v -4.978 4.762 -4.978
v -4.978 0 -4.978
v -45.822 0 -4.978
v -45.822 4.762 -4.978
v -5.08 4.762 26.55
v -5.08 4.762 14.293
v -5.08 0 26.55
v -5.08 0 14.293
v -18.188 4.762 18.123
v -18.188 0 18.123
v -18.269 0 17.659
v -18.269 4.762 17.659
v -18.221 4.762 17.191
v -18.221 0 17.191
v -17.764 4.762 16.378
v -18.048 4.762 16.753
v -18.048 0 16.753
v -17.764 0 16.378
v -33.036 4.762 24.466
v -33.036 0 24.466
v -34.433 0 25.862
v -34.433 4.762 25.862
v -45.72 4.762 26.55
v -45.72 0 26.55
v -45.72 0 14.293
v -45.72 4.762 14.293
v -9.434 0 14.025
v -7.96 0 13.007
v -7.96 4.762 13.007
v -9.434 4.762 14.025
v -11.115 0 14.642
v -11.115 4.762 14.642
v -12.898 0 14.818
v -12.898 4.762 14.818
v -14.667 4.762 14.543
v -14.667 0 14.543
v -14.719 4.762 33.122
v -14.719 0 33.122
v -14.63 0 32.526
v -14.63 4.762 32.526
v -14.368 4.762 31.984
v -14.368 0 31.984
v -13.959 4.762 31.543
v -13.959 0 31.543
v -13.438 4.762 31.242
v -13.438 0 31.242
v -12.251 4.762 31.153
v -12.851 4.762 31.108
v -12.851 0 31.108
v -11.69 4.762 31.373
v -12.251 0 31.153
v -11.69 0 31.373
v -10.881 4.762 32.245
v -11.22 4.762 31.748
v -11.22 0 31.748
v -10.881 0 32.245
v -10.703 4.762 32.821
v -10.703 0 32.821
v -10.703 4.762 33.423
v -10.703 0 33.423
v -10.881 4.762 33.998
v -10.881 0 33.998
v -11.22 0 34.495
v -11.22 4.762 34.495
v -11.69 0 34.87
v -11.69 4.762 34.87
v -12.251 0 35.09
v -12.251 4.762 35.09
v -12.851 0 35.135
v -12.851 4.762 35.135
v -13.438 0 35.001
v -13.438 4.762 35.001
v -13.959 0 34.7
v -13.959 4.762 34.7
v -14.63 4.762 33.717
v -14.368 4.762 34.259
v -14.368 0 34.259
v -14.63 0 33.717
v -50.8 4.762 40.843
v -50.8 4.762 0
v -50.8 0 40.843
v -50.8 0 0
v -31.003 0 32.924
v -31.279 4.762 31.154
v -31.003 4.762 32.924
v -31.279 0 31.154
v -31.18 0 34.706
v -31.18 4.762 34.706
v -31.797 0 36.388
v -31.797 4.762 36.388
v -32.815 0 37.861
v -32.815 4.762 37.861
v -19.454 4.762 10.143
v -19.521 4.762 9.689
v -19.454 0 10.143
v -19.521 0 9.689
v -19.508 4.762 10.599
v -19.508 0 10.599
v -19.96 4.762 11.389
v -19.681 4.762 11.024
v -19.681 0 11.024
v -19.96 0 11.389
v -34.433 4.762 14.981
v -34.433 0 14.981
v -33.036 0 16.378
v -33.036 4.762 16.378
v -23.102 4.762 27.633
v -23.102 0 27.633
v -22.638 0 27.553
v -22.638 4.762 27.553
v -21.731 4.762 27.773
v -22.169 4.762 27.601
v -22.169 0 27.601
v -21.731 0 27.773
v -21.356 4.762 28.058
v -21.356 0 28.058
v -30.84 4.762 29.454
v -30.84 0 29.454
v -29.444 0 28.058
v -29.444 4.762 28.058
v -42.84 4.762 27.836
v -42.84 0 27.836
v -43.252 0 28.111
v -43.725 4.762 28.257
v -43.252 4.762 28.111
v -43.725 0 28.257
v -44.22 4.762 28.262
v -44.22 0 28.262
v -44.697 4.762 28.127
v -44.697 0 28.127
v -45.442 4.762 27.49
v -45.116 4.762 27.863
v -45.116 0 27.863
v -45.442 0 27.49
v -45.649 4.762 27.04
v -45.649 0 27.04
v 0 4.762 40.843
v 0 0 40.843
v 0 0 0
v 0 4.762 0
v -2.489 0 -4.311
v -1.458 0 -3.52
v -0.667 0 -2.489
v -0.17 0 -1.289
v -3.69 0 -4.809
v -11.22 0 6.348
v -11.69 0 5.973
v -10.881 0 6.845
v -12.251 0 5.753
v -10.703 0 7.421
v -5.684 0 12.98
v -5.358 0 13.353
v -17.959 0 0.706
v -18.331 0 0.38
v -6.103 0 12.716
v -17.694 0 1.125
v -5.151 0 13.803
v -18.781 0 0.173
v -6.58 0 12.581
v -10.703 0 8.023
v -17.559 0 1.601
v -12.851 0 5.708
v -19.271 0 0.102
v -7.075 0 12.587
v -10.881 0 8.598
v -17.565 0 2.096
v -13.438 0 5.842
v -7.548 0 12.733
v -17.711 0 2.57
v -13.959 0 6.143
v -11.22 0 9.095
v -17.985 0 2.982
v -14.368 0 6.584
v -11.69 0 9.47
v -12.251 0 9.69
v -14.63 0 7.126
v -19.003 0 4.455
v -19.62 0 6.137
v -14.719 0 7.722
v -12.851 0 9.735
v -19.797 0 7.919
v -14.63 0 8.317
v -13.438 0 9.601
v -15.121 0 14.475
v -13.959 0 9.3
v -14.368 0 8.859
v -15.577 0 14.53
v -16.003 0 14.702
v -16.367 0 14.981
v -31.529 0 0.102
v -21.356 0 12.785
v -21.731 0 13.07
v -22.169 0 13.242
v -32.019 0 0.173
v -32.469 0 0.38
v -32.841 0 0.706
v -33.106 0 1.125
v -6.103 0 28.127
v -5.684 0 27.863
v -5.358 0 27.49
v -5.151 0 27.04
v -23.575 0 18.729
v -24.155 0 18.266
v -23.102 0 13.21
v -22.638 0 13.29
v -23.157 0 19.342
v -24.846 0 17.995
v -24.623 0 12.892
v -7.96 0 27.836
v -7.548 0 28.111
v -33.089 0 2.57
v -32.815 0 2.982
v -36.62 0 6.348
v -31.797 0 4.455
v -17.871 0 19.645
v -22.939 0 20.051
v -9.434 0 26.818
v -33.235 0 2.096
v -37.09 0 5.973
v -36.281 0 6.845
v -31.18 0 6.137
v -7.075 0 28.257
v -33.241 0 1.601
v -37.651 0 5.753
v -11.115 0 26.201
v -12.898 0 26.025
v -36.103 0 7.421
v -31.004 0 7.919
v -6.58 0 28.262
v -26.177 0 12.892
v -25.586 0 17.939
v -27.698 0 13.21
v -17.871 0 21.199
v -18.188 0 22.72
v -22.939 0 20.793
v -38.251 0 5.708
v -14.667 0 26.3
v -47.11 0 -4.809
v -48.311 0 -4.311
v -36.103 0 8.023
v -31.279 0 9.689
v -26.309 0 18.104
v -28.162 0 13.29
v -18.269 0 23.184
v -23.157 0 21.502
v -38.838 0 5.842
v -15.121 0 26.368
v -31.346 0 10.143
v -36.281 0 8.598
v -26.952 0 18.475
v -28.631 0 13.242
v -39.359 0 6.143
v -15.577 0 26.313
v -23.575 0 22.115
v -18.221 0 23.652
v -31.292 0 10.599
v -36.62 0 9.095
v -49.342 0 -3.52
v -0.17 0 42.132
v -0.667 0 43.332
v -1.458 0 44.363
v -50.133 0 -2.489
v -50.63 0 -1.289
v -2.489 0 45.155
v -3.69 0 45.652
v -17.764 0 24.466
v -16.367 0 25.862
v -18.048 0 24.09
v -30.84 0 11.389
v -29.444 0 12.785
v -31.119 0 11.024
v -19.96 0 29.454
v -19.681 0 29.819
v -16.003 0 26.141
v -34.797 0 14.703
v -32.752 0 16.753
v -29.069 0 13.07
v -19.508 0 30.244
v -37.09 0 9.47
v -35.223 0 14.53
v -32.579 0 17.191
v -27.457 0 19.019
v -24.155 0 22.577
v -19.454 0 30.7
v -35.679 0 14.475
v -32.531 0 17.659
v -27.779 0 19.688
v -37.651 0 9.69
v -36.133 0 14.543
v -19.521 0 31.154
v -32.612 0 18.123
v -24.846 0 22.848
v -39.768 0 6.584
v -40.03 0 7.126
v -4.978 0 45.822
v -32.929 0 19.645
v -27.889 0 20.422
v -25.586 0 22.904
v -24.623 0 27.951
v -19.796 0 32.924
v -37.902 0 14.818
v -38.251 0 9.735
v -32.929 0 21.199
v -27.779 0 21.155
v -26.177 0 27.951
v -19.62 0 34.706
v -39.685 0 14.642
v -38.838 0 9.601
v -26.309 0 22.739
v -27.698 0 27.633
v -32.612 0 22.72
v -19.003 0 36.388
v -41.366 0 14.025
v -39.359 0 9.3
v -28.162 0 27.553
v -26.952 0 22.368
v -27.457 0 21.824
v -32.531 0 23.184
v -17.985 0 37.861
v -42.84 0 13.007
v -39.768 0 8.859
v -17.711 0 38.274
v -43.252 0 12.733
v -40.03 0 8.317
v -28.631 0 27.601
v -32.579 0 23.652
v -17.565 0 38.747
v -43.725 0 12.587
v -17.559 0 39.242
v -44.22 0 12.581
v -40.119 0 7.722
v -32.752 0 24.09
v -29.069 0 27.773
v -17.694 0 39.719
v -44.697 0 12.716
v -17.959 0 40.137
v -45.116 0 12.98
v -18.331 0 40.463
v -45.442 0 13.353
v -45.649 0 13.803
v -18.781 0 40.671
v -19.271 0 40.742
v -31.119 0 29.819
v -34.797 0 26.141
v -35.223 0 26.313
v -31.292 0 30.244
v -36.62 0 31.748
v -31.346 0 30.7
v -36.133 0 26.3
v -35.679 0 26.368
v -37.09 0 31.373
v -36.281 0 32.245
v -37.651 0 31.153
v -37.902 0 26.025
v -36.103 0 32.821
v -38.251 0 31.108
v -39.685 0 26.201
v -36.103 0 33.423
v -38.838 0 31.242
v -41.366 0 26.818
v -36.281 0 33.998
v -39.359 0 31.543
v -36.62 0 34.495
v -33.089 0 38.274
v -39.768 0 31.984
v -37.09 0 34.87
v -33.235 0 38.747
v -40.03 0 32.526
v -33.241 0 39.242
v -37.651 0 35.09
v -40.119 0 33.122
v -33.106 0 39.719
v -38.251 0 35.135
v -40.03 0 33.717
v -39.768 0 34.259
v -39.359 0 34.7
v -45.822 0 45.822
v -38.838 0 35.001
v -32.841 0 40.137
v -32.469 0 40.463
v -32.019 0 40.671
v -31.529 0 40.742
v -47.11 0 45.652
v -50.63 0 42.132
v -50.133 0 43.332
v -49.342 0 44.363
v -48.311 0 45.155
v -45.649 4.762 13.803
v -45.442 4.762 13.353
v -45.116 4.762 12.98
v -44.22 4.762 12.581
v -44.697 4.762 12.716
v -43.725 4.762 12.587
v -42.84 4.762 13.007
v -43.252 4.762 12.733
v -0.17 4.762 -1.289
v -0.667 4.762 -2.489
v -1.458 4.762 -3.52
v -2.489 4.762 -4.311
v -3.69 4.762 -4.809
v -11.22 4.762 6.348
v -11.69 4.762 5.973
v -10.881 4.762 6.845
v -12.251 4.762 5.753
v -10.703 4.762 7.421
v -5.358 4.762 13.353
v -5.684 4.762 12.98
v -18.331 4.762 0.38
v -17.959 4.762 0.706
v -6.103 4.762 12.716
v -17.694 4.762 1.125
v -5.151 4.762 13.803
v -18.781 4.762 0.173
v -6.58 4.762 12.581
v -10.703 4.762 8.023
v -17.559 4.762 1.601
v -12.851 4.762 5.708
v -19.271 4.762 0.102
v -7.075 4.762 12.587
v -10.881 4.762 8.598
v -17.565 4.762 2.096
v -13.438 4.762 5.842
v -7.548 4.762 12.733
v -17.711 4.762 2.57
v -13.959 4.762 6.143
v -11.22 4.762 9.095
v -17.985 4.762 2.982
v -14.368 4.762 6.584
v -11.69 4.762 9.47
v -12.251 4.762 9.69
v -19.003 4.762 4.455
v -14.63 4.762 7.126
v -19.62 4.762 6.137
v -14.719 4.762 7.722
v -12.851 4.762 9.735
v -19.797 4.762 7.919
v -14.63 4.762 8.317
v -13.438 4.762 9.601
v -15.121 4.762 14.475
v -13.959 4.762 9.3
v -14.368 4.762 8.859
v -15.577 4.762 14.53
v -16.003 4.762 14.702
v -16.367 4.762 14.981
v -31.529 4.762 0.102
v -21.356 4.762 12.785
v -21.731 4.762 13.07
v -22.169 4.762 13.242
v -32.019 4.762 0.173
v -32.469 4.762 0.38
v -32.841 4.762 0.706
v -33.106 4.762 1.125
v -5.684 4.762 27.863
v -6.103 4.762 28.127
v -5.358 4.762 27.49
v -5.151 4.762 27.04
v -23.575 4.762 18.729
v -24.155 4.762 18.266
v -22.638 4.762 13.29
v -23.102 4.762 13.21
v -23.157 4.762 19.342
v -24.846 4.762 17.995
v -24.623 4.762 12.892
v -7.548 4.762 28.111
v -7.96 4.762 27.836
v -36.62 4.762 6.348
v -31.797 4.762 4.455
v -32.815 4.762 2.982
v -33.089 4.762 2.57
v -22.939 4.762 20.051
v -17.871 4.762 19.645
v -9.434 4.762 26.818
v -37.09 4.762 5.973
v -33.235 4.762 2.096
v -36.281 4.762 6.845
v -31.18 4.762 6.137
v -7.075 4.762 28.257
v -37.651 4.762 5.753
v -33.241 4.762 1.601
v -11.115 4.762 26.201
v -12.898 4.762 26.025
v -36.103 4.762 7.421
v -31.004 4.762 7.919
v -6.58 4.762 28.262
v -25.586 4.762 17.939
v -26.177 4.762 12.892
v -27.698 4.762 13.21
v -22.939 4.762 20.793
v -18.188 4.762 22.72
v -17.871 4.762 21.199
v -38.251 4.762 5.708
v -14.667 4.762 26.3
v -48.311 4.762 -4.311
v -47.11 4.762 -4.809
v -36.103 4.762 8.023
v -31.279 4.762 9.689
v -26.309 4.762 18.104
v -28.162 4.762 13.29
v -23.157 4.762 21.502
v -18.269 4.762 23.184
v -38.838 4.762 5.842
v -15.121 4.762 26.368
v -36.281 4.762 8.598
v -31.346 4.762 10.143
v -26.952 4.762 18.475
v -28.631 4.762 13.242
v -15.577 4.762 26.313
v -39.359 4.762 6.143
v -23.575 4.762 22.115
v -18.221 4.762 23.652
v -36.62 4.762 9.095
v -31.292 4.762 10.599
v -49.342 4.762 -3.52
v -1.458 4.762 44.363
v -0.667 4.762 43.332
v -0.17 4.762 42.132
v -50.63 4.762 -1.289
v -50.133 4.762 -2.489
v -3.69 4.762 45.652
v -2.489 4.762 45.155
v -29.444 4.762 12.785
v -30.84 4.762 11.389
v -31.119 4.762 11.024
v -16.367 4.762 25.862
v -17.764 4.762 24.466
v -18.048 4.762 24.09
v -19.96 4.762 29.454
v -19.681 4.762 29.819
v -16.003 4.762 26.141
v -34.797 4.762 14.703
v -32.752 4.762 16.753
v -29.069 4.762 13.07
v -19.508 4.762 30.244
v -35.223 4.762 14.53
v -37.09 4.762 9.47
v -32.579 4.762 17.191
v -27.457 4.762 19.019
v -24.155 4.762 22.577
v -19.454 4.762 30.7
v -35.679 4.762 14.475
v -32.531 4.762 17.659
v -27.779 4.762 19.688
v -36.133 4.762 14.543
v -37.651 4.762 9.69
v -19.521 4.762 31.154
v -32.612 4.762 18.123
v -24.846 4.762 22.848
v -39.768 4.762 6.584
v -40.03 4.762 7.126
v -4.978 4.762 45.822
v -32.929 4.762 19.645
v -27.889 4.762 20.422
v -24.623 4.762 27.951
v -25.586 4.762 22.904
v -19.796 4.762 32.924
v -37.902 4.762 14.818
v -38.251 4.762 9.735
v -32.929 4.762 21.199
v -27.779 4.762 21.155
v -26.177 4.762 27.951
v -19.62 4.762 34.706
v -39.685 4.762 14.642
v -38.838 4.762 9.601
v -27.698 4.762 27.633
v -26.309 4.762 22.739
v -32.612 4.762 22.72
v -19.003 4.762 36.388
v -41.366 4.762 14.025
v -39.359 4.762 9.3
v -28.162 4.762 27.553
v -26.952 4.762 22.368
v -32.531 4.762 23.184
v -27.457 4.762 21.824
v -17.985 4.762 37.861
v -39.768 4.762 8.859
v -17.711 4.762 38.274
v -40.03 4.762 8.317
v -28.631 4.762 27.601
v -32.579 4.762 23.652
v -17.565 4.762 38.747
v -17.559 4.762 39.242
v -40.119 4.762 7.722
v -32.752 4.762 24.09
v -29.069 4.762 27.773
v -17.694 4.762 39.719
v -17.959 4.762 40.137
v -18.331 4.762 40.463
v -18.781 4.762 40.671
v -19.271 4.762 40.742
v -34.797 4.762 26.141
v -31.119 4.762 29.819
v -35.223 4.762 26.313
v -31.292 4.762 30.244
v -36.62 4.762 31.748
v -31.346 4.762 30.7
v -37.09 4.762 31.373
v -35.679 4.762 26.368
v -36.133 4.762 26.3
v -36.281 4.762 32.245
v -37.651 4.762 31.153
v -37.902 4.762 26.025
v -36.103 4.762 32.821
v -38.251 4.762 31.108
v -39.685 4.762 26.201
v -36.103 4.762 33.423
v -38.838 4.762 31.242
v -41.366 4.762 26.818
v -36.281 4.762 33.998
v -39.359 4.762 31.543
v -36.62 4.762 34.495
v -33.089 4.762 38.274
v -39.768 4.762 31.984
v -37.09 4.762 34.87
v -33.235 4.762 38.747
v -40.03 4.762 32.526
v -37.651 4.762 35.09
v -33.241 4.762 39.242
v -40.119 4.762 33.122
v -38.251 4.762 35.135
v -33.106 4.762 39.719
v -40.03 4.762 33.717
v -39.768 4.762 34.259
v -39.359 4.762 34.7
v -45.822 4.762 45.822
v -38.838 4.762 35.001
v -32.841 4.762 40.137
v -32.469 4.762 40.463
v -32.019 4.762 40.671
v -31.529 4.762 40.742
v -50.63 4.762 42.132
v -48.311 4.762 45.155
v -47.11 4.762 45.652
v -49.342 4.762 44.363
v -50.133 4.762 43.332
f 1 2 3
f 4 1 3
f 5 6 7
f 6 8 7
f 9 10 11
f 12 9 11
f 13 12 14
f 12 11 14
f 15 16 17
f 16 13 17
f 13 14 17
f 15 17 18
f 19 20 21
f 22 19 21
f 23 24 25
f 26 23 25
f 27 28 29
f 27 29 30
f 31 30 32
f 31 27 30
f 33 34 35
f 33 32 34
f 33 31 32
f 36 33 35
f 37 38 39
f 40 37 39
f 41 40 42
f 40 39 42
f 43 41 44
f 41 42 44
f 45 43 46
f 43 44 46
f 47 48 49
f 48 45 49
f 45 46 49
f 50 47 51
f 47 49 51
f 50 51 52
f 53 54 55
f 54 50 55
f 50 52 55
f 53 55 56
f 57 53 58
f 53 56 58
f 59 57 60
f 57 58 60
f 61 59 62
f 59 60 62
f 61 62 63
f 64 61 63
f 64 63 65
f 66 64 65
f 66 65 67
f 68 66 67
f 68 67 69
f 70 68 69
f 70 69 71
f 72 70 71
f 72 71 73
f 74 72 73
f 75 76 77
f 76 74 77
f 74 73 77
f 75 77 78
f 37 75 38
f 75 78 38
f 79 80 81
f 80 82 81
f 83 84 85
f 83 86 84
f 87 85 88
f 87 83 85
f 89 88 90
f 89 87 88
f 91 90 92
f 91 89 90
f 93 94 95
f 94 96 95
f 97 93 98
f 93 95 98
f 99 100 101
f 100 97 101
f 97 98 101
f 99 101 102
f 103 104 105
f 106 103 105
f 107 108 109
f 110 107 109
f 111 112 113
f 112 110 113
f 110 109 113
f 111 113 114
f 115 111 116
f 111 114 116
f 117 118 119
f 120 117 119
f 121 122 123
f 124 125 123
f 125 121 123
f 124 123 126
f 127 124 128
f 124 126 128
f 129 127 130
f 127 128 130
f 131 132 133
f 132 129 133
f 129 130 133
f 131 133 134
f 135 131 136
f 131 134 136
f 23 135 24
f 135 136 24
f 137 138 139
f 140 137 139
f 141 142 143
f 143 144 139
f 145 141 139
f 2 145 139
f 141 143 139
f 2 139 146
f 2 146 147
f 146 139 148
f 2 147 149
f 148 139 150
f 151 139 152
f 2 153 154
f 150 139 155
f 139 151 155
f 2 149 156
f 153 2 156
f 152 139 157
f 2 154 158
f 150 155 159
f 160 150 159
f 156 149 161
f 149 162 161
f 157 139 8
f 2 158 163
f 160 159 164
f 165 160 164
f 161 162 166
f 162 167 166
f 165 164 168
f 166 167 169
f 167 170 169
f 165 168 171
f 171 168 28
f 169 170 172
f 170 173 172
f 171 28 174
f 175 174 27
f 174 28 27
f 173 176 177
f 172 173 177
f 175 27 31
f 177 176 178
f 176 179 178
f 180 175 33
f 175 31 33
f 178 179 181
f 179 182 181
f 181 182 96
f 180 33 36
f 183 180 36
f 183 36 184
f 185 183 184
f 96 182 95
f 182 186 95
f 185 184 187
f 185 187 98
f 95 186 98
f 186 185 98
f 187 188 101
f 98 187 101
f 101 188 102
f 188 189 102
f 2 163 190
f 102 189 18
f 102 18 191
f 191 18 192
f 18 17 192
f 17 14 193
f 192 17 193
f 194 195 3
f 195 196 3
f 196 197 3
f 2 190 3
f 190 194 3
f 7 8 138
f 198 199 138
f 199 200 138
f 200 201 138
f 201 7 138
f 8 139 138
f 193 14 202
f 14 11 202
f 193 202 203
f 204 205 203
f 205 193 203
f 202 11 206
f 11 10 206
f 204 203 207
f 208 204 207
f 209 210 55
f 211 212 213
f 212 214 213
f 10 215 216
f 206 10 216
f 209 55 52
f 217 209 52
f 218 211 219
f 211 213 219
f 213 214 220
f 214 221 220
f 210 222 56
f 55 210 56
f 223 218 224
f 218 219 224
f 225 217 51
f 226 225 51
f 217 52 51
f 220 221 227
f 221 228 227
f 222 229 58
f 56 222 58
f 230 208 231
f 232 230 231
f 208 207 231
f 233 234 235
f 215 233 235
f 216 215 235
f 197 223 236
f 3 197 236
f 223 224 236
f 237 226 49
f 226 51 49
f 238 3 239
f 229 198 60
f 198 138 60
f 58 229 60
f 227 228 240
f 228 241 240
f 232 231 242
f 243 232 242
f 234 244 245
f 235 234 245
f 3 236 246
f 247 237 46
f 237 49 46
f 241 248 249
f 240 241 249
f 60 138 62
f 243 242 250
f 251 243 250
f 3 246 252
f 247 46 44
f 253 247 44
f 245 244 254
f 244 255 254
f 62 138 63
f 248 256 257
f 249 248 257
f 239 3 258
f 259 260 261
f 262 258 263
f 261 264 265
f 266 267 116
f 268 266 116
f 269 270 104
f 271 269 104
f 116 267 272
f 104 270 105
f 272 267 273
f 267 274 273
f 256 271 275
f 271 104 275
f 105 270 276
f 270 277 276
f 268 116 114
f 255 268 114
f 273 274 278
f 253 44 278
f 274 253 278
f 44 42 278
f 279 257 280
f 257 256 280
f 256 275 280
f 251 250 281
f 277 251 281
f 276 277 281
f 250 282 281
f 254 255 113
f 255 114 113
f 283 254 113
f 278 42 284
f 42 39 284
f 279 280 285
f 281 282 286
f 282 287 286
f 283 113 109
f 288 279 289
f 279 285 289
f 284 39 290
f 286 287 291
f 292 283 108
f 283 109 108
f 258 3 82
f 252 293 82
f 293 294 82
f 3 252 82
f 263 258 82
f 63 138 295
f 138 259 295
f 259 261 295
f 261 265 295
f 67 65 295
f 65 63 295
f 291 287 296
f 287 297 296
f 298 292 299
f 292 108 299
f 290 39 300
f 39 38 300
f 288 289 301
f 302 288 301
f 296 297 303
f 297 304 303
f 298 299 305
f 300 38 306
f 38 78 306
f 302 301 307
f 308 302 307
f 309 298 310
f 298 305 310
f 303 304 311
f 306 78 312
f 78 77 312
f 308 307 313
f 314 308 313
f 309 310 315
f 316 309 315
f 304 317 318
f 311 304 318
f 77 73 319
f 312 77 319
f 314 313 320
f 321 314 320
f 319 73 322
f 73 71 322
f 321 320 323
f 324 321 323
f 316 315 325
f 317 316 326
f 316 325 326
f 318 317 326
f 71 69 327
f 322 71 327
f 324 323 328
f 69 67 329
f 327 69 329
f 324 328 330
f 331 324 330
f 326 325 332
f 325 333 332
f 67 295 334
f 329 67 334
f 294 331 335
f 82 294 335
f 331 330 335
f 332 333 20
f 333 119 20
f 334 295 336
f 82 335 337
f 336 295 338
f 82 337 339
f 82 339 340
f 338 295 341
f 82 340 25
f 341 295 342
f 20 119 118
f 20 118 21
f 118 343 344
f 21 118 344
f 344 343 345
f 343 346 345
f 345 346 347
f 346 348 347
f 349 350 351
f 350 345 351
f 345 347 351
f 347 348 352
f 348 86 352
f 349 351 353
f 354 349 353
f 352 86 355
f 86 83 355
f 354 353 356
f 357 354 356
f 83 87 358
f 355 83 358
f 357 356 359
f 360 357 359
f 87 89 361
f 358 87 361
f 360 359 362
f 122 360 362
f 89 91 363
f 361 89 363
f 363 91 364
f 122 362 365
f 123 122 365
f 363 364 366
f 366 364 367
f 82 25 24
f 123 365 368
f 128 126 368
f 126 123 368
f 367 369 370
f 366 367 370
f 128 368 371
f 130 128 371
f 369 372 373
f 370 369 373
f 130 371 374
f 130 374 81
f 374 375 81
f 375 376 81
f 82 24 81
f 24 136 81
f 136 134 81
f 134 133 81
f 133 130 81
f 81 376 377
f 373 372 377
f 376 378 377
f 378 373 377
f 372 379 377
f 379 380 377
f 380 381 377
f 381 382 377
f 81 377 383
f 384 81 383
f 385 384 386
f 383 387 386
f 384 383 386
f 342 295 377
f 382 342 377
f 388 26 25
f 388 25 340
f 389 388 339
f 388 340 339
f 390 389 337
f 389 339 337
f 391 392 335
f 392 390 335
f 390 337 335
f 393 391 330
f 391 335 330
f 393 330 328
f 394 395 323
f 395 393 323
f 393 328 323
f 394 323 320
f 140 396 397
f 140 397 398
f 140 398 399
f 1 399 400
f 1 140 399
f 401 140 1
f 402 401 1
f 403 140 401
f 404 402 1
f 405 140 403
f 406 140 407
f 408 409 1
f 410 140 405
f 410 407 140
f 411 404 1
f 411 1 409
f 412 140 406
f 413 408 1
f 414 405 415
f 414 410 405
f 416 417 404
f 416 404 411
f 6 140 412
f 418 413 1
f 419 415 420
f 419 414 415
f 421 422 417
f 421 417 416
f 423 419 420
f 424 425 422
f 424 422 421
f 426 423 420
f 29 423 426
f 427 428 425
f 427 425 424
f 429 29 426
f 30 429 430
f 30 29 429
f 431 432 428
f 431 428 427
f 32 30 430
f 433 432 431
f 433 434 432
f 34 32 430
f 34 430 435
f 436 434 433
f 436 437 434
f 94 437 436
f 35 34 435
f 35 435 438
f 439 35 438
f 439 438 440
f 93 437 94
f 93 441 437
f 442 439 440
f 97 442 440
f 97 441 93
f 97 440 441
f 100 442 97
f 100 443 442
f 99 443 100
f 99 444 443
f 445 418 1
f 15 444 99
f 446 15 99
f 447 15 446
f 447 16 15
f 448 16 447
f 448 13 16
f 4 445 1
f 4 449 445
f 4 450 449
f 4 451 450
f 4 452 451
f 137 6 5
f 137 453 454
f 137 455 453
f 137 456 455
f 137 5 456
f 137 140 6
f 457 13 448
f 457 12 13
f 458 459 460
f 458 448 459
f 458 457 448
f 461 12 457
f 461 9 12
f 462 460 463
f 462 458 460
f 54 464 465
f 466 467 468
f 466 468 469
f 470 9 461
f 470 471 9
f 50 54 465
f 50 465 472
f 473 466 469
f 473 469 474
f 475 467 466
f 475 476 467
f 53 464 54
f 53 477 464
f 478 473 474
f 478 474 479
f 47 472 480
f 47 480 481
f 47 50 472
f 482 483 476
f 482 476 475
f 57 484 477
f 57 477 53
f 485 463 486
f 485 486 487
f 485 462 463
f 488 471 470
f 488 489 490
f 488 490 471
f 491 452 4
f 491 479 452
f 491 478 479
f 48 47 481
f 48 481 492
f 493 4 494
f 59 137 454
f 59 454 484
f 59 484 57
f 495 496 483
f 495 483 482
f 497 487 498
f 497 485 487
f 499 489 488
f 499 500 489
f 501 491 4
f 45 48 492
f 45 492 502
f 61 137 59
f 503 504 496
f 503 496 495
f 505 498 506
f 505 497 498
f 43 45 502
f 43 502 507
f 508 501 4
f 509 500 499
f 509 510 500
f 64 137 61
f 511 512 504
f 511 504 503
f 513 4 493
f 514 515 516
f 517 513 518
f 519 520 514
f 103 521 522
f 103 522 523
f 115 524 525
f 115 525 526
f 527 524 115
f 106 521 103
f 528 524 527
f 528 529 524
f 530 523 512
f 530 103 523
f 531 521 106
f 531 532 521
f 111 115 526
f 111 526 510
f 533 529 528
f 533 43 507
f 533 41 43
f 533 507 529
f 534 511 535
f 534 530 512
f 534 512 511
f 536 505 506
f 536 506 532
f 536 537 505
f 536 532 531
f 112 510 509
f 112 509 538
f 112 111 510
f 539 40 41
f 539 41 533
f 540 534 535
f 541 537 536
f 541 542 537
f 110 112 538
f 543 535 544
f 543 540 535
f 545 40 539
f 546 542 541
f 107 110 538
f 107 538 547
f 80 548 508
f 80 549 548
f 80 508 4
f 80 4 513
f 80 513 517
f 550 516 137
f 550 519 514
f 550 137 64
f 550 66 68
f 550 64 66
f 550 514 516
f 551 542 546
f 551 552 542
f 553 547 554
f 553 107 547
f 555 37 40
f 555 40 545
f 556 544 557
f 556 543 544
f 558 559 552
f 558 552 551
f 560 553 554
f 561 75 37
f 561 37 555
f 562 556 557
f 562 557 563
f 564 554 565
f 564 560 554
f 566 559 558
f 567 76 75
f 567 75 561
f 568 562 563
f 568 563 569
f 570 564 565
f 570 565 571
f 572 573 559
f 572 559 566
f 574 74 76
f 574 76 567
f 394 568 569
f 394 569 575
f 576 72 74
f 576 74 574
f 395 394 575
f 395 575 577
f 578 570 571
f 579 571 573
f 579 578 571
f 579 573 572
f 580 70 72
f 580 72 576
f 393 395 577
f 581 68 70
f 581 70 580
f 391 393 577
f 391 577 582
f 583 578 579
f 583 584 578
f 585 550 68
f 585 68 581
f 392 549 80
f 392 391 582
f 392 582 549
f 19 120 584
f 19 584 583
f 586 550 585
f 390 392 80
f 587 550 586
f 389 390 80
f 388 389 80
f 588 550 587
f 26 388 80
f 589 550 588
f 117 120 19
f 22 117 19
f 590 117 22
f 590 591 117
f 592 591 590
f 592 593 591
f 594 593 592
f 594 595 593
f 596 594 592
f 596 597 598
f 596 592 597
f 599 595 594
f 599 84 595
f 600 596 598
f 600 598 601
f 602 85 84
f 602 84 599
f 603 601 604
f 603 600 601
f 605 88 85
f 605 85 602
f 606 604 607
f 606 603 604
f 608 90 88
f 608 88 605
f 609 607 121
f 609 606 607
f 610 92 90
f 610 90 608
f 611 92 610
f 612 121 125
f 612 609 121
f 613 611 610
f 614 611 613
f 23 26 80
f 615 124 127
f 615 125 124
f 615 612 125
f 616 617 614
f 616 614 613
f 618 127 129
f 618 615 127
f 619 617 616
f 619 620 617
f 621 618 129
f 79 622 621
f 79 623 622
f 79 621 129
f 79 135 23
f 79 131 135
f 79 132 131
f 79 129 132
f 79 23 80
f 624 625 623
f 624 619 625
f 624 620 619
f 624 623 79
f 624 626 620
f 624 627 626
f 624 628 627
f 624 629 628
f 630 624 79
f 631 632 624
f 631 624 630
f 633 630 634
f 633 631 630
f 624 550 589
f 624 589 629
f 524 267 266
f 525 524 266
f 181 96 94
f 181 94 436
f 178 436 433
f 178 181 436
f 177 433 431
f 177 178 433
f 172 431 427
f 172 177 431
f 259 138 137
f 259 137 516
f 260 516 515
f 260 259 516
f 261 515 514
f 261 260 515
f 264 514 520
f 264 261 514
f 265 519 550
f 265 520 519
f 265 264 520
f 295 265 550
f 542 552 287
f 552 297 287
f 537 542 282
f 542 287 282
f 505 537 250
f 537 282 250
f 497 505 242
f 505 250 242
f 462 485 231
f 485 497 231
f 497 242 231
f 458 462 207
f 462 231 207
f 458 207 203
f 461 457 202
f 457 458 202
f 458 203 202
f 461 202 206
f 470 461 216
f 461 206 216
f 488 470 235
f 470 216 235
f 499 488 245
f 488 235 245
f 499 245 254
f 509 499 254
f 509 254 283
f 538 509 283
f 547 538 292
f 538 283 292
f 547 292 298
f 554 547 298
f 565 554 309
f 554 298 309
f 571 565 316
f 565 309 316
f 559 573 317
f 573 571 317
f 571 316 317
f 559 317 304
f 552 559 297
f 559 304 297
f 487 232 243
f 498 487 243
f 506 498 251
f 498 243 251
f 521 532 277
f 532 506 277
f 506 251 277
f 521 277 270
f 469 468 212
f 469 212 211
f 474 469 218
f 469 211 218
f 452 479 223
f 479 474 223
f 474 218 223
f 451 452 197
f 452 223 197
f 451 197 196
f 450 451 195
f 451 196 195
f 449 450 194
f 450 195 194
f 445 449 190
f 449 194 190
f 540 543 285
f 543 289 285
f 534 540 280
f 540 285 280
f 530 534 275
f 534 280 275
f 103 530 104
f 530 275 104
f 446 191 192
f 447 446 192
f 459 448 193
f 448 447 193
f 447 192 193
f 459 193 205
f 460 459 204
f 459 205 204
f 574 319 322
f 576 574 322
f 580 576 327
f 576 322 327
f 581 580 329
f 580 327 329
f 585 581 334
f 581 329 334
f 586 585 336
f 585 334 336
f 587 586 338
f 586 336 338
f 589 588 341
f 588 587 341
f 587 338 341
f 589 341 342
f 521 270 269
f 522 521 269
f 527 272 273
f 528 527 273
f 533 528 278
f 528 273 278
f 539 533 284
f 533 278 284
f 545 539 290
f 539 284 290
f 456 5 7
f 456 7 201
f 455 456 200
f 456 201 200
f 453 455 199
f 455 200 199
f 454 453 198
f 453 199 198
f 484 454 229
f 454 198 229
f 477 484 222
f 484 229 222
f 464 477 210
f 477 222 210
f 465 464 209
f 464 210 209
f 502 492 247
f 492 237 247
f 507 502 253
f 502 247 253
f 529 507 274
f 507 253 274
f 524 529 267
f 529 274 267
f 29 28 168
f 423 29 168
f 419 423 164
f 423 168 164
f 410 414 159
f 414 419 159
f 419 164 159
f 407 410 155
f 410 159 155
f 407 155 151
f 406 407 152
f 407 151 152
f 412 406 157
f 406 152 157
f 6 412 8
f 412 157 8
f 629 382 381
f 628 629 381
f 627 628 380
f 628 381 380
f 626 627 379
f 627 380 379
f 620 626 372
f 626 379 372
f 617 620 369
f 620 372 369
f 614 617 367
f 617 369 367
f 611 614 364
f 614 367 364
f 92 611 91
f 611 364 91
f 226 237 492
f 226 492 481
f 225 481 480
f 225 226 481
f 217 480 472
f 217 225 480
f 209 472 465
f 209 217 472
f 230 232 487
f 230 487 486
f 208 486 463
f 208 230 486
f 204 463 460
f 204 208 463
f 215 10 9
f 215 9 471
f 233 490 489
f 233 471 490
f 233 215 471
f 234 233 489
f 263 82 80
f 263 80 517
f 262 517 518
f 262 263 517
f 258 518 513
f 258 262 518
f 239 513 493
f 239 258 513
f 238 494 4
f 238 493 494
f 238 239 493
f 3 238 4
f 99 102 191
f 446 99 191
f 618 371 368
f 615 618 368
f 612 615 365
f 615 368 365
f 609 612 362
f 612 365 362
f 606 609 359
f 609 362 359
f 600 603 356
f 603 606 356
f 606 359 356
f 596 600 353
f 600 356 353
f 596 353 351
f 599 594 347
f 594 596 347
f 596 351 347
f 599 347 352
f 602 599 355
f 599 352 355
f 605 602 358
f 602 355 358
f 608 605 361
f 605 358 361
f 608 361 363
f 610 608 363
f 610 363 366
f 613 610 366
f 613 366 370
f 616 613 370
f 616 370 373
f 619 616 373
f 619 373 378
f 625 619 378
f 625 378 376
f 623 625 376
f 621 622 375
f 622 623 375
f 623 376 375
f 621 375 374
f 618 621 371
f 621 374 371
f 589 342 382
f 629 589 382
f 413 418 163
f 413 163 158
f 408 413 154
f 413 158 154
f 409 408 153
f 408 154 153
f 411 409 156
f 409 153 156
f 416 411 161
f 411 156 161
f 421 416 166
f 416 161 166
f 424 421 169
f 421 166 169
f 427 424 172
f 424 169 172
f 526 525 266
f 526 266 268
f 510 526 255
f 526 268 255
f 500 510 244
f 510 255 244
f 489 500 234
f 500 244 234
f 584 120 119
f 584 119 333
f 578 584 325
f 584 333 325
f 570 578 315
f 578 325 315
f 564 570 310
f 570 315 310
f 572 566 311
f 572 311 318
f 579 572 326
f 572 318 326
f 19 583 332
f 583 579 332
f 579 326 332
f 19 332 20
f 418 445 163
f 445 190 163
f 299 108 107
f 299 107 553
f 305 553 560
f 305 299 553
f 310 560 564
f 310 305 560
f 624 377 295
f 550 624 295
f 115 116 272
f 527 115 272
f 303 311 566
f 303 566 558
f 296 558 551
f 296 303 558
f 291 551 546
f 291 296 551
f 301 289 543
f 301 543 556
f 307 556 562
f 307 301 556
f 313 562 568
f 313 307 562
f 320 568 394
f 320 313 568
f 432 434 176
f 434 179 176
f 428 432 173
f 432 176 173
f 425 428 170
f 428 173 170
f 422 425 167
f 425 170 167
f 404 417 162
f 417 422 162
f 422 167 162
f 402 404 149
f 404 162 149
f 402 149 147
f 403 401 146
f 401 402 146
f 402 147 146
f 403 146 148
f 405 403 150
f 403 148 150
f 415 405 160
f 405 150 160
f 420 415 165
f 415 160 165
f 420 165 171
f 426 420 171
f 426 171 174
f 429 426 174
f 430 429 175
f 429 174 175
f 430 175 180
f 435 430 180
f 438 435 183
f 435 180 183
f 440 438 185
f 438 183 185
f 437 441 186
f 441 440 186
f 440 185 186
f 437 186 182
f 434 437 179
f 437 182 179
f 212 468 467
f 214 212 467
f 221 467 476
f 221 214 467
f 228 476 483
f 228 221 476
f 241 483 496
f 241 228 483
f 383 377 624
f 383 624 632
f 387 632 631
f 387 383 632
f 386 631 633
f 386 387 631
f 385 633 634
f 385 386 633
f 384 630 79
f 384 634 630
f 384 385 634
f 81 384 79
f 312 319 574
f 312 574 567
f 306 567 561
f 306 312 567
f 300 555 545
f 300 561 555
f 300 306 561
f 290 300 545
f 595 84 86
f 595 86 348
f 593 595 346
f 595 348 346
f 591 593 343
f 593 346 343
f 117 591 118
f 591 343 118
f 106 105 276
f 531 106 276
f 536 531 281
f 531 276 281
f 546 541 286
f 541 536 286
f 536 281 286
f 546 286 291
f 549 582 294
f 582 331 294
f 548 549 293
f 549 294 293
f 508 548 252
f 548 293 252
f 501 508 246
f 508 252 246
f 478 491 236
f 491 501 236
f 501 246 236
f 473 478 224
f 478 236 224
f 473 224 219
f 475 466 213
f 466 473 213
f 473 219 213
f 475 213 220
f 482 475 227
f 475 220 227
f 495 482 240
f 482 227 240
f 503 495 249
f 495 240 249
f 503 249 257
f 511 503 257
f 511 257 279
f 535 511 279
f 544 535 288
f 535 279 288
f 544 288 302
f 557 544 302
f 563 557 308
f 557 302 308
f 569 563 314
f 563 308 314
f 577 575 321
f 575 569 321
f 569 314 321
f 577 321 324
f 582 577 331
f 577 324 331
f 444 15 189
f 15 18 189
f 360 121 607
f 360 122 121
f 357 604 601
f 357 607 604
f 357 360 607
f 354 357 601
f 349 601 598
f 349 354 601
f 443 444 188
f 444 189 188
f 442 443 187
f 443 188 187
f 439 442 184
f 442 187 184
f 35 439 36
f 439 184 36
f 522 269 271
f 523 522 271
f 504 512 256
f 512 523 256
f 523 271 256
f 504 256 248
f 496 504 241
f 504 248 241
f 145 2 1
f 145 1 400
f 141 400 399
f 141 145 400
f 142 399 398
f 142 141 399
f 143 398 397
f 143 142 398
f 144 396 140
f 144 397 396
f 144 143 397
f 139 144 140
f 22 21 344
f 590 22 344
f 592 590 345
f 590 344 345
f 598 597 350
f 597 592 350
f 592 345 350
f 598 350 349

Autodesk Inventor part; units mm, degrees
ref_plane "YZ Plane" through (0, 0, 0) normal (1, 0, 0) x (0, 1, 0)
ref_plane "XZ Plane" through (0, 0, 0) normal (0, 1, 0) x (-1, 0, 0)
ref_plane "XY Plane" through (0, 0, 0) normal (0, 0, 1) x (1, 0, 0)
sketch "Sketch2" plane through (0, 0, 0) normal (0, 1, 0) x (-1, 0, 0)
  line L0 (45.8216, 45.8216) -> (4.9784, 45.8216)
  arc A0 (4.9784, 45.8216) -> (0, 40.8432) centre (4.9784, 40.8432) ccw
  line L1 (0, 40.8432) -> (0, 0)
  arc A1 (0, 0) -> (4.9784, -4.9784) centre (4.9784, 0) ccw
  line L2 (4.9784, -4.9784) -> (45.8216, -4.9784)
  arc A2 (45.8216, -4.9784) -> (50.8, 0) centre (45.8216, 0) ccw
  line L3 (50.8, 0) -> (50.8, 40.8432)
  arc A3 (50.8, 40.8432) -> (45.8216, 45.8216) centre (45.8216, 40.8432) ccw
  arc A4 (33.0362, 24.4657) -> (32.6118, 22.7199) centre (34.2575, 23.2444) ccw
  line L4 (33.0362, 24.4657) -> (34.4326, 25.8621)
  arc A5 (36.1326, 26.3004) -> (34.4326, 25.8621) centre (35.6539, 24.6408) ccw
  arc A6 (36.1326, 26.3004) -> (42.8397, 27.8362) centre (38.1, 33.1216) ccw
  arc A7 (45.72, 26.5503) -> (42.8397, 27.8362) centre (43.9928, 26.5503) ccw
  line L5 (45.72, 26.5503) -> (45.72, 14.2929)
  arc A8 (42.8397, 13.007) -> (45.72, 14.2929) centre (43.9928, 14.2929) ccw
  arc A9 (42.8397, 13.007) -> (36.1326, 14.5428) centre (38.1, 7.7216) ccw
  arc A10 (34.4326, 14.9811) -> (36.1326, 14.5428) centre (35.6539, 16.2024) ccw
  line L6 (34.4326, 14.9811) -> (33.0362, 16.3775)
  arc A11 (32.6118, 18.1233) -> (33.0362, 16.3775) centre (34.2575, 17.5988) ccw
  arc A12 (32.6118, 18.1233) -> (32.6118, 22.7199) centre (25.4, 20.4216) ccw
  arc A13 (17.7638, 16.3775) -> (18.1882, 18.1233) centre (16.5425, 17.5988) ccw
  line L7 (17.7638, 16.3775) -> (16.3674, 14.9811)
  arc A14 (14.6674, 14.5428) -> (16.3674, 14.9811) centre (15.1461, 16.2024) ccw
  arc A15 (14.6674, 14.5428) -> (7.9603, 13.007) centre (12.7, 7.7216) ccw
  arc A16 (5.08, 14.2929) -> (7.9603, 13.007) centre (6.8072, 14.2929) ccw
  line L8 (5.08, 14.2929) -> (5.08, 26.5503)
  arc A17 (7.9603, 27.8362) -> (5.08, 26.5503) centre (6.8072, 26.5503) ccw
  arc A18 (7.9603, 27.8362) -> (14.6674, 26.3004) centre (12.7, 33.1216) ccw
  arc A19 (16.3674, 25.8621) -> (14.6674, 26.3004) centre (15.1461, 24.6408) ccw
  line L9 (16.3674, 25.8621) -> (17.7638, 24.4657)
  arc A20 (18.1882, 22.7199) -> (17.7638, 24.4657) centre (16.5425, 23.2444) ccw
  arc A21 (18.1882, 22.7199) -> (18.1882, 18.1233) centre (25.4, 20.4216) ccw
  arc A22 (30.8405, 29.4542) -> (31.2788, 31.1542) centre (29.6192, 30.6755) ccw
  line L10 (30.8405, 29.4542) -> (29.4441, 28.0578)
  arc A23 (27.6983, 27.6334) -> (29.4441, 28.0578) centre (28.2228, 29.2791) ccw
  arc A24 (27.6983, 27.6334) -> (23.1017, 27.6334) centre (25.4, 20.4216) ccw
  arc A25 (21.3559, 28.0578) -> (23.1017, 27.6334) centre (22.5772, 29.2791) ccw
  line L11 (21.3559, 28.0578) -> (19.9595, 29.4542)
  arc A26 (19.5212, 31.1542) -> (19.9595, 29.4542) centre (21.1808, 30.6755) ccw
  arc A27 (19.5212, 31.1542) -> (17.9854, 37.8613) centre (12.7, 33.1216) ccw
  arc A28 (19.2713, 40.7416) -> (17.9854, 37.8613) centre (19.2713, 39.0144) ccw
  line L12 (19.2713, 40.7416) -> (31.5287, 40.7416)
  arc A29 (32.8146, 37.8613) -> (31.5287, 40.7416) centre (31.5287, 39.0144) ccw
  arc A30 (32.8146, 37.8613) -> (31.2788, 31.1542) centre (38.1, 33.1216) ccw
  arc A31 (19.9595, 11.389) -> (19.5212, 9.689) centre (21.1808, 10.1677) ccw
  line L13 (19.9595, 11.389) -> (21.3559, 12.7854)
  arc A32 (23.1017, 13.2098) -> (21.3559, 12.7854) centre (22.5772, 11.5641) ccw
  arc A33 (23.1017, 13.2098) -> (27.6983, 13.2098) centre (25.4, 20.4216) ccw
  arc A34 (29.4441, 12.7854) -> (27.6983, 13.2098) centre (28.2228, 11.5641) ccw
  line L14 (29.4441, 12.7854) -> (30.8405, 11.389)
  arc A35 (31.2788, 9.689) -> (30.8405, 11.389) centre (29.6192, 10.1677) ccw
  arc A36 (31.2788, 9.689) -> (32.8146, 2.9819) centre (38.1, 7.7216) ccw
  arc A37 (31.5287, 0.1016) -> (32.8146, 2.9819) centre (31.5287, 1.8288) ccw
  line L15 (31.5287, 0.1016) -> (19.2713, 0.1016)
  arc A38 (17.9854, 2.9819) -> (19.2713, 0.1016) centre (19.2713, 1.8288) ccw
  arc A39 (17.9854, 2.9819) -> (19.5212, 9.689) centre (12.7, 7.7216) ccw
  circle A40 centre (12.7, 7.7216) radius 2.0193
  circle A41 centre (12.7, 33.1216) radius 2.0193
  circle A42 centre (38.1, 33.1216) radius 2.0193
  circle A43 centre (38.1, 7.7216) radius 2.0193
  circle A44 centre (25.4, 20.4216) radius 2.4892
  point P0 (0, 40.8432)
  point P1 (4.9784, -4.9784)
  point P2 (50.8, 0)
  point P3 (23.1017, 13.2098)
  point P4 (27.6983, 13.2098)
  point P5 (29.4441, 12.7854)
  point P6 (32.8146, 2.9819)
  point P7 (31.5287, 0.1016)
  point P8 (17.9854, 2.9819)
  point P9 (19.5212, 9.689)
  point P10 (19.5212, 31.1542)
  point P11 (7.9603, 13.007)
  point P12 (5.08, 14.2929)
  point P13 (7.9603, 27.8362)
  point P14 (14.6674, 26.3004)
  point P15 (36.1326, 26.3004)
  point P16 (42.8397, 13.007)
  point P17 (36.1326, 14.5428)
  point P18 (34.4326, 14.9811)
extrude "Plate2" add sketch "Sketch2" along normal blind 4.7625
equation "\"d11\" = Thickness"
equation "\"BendRadius\" = 1.5 * Thickness"
equation "\"BendReliefWidth\" = Thickness"
equation "\"BendReliefDepth\" = 0.5 * Thickness"
equation "\"CornerReliefSize\" = 4 * Thickness"
equation "\"MinimumRemnant\" = 2 * Thickness"
equation "\"TransitionRadius\" = BendRadius"
equation "\"JacobiRadiusSize\" = BendRadius"
equation "\"GapSize\" = Thickness"
equation "\"Thickness\" = 4.7625"
properties part number "climber-axle-endcap" material "Polycarbonate, Clear"
